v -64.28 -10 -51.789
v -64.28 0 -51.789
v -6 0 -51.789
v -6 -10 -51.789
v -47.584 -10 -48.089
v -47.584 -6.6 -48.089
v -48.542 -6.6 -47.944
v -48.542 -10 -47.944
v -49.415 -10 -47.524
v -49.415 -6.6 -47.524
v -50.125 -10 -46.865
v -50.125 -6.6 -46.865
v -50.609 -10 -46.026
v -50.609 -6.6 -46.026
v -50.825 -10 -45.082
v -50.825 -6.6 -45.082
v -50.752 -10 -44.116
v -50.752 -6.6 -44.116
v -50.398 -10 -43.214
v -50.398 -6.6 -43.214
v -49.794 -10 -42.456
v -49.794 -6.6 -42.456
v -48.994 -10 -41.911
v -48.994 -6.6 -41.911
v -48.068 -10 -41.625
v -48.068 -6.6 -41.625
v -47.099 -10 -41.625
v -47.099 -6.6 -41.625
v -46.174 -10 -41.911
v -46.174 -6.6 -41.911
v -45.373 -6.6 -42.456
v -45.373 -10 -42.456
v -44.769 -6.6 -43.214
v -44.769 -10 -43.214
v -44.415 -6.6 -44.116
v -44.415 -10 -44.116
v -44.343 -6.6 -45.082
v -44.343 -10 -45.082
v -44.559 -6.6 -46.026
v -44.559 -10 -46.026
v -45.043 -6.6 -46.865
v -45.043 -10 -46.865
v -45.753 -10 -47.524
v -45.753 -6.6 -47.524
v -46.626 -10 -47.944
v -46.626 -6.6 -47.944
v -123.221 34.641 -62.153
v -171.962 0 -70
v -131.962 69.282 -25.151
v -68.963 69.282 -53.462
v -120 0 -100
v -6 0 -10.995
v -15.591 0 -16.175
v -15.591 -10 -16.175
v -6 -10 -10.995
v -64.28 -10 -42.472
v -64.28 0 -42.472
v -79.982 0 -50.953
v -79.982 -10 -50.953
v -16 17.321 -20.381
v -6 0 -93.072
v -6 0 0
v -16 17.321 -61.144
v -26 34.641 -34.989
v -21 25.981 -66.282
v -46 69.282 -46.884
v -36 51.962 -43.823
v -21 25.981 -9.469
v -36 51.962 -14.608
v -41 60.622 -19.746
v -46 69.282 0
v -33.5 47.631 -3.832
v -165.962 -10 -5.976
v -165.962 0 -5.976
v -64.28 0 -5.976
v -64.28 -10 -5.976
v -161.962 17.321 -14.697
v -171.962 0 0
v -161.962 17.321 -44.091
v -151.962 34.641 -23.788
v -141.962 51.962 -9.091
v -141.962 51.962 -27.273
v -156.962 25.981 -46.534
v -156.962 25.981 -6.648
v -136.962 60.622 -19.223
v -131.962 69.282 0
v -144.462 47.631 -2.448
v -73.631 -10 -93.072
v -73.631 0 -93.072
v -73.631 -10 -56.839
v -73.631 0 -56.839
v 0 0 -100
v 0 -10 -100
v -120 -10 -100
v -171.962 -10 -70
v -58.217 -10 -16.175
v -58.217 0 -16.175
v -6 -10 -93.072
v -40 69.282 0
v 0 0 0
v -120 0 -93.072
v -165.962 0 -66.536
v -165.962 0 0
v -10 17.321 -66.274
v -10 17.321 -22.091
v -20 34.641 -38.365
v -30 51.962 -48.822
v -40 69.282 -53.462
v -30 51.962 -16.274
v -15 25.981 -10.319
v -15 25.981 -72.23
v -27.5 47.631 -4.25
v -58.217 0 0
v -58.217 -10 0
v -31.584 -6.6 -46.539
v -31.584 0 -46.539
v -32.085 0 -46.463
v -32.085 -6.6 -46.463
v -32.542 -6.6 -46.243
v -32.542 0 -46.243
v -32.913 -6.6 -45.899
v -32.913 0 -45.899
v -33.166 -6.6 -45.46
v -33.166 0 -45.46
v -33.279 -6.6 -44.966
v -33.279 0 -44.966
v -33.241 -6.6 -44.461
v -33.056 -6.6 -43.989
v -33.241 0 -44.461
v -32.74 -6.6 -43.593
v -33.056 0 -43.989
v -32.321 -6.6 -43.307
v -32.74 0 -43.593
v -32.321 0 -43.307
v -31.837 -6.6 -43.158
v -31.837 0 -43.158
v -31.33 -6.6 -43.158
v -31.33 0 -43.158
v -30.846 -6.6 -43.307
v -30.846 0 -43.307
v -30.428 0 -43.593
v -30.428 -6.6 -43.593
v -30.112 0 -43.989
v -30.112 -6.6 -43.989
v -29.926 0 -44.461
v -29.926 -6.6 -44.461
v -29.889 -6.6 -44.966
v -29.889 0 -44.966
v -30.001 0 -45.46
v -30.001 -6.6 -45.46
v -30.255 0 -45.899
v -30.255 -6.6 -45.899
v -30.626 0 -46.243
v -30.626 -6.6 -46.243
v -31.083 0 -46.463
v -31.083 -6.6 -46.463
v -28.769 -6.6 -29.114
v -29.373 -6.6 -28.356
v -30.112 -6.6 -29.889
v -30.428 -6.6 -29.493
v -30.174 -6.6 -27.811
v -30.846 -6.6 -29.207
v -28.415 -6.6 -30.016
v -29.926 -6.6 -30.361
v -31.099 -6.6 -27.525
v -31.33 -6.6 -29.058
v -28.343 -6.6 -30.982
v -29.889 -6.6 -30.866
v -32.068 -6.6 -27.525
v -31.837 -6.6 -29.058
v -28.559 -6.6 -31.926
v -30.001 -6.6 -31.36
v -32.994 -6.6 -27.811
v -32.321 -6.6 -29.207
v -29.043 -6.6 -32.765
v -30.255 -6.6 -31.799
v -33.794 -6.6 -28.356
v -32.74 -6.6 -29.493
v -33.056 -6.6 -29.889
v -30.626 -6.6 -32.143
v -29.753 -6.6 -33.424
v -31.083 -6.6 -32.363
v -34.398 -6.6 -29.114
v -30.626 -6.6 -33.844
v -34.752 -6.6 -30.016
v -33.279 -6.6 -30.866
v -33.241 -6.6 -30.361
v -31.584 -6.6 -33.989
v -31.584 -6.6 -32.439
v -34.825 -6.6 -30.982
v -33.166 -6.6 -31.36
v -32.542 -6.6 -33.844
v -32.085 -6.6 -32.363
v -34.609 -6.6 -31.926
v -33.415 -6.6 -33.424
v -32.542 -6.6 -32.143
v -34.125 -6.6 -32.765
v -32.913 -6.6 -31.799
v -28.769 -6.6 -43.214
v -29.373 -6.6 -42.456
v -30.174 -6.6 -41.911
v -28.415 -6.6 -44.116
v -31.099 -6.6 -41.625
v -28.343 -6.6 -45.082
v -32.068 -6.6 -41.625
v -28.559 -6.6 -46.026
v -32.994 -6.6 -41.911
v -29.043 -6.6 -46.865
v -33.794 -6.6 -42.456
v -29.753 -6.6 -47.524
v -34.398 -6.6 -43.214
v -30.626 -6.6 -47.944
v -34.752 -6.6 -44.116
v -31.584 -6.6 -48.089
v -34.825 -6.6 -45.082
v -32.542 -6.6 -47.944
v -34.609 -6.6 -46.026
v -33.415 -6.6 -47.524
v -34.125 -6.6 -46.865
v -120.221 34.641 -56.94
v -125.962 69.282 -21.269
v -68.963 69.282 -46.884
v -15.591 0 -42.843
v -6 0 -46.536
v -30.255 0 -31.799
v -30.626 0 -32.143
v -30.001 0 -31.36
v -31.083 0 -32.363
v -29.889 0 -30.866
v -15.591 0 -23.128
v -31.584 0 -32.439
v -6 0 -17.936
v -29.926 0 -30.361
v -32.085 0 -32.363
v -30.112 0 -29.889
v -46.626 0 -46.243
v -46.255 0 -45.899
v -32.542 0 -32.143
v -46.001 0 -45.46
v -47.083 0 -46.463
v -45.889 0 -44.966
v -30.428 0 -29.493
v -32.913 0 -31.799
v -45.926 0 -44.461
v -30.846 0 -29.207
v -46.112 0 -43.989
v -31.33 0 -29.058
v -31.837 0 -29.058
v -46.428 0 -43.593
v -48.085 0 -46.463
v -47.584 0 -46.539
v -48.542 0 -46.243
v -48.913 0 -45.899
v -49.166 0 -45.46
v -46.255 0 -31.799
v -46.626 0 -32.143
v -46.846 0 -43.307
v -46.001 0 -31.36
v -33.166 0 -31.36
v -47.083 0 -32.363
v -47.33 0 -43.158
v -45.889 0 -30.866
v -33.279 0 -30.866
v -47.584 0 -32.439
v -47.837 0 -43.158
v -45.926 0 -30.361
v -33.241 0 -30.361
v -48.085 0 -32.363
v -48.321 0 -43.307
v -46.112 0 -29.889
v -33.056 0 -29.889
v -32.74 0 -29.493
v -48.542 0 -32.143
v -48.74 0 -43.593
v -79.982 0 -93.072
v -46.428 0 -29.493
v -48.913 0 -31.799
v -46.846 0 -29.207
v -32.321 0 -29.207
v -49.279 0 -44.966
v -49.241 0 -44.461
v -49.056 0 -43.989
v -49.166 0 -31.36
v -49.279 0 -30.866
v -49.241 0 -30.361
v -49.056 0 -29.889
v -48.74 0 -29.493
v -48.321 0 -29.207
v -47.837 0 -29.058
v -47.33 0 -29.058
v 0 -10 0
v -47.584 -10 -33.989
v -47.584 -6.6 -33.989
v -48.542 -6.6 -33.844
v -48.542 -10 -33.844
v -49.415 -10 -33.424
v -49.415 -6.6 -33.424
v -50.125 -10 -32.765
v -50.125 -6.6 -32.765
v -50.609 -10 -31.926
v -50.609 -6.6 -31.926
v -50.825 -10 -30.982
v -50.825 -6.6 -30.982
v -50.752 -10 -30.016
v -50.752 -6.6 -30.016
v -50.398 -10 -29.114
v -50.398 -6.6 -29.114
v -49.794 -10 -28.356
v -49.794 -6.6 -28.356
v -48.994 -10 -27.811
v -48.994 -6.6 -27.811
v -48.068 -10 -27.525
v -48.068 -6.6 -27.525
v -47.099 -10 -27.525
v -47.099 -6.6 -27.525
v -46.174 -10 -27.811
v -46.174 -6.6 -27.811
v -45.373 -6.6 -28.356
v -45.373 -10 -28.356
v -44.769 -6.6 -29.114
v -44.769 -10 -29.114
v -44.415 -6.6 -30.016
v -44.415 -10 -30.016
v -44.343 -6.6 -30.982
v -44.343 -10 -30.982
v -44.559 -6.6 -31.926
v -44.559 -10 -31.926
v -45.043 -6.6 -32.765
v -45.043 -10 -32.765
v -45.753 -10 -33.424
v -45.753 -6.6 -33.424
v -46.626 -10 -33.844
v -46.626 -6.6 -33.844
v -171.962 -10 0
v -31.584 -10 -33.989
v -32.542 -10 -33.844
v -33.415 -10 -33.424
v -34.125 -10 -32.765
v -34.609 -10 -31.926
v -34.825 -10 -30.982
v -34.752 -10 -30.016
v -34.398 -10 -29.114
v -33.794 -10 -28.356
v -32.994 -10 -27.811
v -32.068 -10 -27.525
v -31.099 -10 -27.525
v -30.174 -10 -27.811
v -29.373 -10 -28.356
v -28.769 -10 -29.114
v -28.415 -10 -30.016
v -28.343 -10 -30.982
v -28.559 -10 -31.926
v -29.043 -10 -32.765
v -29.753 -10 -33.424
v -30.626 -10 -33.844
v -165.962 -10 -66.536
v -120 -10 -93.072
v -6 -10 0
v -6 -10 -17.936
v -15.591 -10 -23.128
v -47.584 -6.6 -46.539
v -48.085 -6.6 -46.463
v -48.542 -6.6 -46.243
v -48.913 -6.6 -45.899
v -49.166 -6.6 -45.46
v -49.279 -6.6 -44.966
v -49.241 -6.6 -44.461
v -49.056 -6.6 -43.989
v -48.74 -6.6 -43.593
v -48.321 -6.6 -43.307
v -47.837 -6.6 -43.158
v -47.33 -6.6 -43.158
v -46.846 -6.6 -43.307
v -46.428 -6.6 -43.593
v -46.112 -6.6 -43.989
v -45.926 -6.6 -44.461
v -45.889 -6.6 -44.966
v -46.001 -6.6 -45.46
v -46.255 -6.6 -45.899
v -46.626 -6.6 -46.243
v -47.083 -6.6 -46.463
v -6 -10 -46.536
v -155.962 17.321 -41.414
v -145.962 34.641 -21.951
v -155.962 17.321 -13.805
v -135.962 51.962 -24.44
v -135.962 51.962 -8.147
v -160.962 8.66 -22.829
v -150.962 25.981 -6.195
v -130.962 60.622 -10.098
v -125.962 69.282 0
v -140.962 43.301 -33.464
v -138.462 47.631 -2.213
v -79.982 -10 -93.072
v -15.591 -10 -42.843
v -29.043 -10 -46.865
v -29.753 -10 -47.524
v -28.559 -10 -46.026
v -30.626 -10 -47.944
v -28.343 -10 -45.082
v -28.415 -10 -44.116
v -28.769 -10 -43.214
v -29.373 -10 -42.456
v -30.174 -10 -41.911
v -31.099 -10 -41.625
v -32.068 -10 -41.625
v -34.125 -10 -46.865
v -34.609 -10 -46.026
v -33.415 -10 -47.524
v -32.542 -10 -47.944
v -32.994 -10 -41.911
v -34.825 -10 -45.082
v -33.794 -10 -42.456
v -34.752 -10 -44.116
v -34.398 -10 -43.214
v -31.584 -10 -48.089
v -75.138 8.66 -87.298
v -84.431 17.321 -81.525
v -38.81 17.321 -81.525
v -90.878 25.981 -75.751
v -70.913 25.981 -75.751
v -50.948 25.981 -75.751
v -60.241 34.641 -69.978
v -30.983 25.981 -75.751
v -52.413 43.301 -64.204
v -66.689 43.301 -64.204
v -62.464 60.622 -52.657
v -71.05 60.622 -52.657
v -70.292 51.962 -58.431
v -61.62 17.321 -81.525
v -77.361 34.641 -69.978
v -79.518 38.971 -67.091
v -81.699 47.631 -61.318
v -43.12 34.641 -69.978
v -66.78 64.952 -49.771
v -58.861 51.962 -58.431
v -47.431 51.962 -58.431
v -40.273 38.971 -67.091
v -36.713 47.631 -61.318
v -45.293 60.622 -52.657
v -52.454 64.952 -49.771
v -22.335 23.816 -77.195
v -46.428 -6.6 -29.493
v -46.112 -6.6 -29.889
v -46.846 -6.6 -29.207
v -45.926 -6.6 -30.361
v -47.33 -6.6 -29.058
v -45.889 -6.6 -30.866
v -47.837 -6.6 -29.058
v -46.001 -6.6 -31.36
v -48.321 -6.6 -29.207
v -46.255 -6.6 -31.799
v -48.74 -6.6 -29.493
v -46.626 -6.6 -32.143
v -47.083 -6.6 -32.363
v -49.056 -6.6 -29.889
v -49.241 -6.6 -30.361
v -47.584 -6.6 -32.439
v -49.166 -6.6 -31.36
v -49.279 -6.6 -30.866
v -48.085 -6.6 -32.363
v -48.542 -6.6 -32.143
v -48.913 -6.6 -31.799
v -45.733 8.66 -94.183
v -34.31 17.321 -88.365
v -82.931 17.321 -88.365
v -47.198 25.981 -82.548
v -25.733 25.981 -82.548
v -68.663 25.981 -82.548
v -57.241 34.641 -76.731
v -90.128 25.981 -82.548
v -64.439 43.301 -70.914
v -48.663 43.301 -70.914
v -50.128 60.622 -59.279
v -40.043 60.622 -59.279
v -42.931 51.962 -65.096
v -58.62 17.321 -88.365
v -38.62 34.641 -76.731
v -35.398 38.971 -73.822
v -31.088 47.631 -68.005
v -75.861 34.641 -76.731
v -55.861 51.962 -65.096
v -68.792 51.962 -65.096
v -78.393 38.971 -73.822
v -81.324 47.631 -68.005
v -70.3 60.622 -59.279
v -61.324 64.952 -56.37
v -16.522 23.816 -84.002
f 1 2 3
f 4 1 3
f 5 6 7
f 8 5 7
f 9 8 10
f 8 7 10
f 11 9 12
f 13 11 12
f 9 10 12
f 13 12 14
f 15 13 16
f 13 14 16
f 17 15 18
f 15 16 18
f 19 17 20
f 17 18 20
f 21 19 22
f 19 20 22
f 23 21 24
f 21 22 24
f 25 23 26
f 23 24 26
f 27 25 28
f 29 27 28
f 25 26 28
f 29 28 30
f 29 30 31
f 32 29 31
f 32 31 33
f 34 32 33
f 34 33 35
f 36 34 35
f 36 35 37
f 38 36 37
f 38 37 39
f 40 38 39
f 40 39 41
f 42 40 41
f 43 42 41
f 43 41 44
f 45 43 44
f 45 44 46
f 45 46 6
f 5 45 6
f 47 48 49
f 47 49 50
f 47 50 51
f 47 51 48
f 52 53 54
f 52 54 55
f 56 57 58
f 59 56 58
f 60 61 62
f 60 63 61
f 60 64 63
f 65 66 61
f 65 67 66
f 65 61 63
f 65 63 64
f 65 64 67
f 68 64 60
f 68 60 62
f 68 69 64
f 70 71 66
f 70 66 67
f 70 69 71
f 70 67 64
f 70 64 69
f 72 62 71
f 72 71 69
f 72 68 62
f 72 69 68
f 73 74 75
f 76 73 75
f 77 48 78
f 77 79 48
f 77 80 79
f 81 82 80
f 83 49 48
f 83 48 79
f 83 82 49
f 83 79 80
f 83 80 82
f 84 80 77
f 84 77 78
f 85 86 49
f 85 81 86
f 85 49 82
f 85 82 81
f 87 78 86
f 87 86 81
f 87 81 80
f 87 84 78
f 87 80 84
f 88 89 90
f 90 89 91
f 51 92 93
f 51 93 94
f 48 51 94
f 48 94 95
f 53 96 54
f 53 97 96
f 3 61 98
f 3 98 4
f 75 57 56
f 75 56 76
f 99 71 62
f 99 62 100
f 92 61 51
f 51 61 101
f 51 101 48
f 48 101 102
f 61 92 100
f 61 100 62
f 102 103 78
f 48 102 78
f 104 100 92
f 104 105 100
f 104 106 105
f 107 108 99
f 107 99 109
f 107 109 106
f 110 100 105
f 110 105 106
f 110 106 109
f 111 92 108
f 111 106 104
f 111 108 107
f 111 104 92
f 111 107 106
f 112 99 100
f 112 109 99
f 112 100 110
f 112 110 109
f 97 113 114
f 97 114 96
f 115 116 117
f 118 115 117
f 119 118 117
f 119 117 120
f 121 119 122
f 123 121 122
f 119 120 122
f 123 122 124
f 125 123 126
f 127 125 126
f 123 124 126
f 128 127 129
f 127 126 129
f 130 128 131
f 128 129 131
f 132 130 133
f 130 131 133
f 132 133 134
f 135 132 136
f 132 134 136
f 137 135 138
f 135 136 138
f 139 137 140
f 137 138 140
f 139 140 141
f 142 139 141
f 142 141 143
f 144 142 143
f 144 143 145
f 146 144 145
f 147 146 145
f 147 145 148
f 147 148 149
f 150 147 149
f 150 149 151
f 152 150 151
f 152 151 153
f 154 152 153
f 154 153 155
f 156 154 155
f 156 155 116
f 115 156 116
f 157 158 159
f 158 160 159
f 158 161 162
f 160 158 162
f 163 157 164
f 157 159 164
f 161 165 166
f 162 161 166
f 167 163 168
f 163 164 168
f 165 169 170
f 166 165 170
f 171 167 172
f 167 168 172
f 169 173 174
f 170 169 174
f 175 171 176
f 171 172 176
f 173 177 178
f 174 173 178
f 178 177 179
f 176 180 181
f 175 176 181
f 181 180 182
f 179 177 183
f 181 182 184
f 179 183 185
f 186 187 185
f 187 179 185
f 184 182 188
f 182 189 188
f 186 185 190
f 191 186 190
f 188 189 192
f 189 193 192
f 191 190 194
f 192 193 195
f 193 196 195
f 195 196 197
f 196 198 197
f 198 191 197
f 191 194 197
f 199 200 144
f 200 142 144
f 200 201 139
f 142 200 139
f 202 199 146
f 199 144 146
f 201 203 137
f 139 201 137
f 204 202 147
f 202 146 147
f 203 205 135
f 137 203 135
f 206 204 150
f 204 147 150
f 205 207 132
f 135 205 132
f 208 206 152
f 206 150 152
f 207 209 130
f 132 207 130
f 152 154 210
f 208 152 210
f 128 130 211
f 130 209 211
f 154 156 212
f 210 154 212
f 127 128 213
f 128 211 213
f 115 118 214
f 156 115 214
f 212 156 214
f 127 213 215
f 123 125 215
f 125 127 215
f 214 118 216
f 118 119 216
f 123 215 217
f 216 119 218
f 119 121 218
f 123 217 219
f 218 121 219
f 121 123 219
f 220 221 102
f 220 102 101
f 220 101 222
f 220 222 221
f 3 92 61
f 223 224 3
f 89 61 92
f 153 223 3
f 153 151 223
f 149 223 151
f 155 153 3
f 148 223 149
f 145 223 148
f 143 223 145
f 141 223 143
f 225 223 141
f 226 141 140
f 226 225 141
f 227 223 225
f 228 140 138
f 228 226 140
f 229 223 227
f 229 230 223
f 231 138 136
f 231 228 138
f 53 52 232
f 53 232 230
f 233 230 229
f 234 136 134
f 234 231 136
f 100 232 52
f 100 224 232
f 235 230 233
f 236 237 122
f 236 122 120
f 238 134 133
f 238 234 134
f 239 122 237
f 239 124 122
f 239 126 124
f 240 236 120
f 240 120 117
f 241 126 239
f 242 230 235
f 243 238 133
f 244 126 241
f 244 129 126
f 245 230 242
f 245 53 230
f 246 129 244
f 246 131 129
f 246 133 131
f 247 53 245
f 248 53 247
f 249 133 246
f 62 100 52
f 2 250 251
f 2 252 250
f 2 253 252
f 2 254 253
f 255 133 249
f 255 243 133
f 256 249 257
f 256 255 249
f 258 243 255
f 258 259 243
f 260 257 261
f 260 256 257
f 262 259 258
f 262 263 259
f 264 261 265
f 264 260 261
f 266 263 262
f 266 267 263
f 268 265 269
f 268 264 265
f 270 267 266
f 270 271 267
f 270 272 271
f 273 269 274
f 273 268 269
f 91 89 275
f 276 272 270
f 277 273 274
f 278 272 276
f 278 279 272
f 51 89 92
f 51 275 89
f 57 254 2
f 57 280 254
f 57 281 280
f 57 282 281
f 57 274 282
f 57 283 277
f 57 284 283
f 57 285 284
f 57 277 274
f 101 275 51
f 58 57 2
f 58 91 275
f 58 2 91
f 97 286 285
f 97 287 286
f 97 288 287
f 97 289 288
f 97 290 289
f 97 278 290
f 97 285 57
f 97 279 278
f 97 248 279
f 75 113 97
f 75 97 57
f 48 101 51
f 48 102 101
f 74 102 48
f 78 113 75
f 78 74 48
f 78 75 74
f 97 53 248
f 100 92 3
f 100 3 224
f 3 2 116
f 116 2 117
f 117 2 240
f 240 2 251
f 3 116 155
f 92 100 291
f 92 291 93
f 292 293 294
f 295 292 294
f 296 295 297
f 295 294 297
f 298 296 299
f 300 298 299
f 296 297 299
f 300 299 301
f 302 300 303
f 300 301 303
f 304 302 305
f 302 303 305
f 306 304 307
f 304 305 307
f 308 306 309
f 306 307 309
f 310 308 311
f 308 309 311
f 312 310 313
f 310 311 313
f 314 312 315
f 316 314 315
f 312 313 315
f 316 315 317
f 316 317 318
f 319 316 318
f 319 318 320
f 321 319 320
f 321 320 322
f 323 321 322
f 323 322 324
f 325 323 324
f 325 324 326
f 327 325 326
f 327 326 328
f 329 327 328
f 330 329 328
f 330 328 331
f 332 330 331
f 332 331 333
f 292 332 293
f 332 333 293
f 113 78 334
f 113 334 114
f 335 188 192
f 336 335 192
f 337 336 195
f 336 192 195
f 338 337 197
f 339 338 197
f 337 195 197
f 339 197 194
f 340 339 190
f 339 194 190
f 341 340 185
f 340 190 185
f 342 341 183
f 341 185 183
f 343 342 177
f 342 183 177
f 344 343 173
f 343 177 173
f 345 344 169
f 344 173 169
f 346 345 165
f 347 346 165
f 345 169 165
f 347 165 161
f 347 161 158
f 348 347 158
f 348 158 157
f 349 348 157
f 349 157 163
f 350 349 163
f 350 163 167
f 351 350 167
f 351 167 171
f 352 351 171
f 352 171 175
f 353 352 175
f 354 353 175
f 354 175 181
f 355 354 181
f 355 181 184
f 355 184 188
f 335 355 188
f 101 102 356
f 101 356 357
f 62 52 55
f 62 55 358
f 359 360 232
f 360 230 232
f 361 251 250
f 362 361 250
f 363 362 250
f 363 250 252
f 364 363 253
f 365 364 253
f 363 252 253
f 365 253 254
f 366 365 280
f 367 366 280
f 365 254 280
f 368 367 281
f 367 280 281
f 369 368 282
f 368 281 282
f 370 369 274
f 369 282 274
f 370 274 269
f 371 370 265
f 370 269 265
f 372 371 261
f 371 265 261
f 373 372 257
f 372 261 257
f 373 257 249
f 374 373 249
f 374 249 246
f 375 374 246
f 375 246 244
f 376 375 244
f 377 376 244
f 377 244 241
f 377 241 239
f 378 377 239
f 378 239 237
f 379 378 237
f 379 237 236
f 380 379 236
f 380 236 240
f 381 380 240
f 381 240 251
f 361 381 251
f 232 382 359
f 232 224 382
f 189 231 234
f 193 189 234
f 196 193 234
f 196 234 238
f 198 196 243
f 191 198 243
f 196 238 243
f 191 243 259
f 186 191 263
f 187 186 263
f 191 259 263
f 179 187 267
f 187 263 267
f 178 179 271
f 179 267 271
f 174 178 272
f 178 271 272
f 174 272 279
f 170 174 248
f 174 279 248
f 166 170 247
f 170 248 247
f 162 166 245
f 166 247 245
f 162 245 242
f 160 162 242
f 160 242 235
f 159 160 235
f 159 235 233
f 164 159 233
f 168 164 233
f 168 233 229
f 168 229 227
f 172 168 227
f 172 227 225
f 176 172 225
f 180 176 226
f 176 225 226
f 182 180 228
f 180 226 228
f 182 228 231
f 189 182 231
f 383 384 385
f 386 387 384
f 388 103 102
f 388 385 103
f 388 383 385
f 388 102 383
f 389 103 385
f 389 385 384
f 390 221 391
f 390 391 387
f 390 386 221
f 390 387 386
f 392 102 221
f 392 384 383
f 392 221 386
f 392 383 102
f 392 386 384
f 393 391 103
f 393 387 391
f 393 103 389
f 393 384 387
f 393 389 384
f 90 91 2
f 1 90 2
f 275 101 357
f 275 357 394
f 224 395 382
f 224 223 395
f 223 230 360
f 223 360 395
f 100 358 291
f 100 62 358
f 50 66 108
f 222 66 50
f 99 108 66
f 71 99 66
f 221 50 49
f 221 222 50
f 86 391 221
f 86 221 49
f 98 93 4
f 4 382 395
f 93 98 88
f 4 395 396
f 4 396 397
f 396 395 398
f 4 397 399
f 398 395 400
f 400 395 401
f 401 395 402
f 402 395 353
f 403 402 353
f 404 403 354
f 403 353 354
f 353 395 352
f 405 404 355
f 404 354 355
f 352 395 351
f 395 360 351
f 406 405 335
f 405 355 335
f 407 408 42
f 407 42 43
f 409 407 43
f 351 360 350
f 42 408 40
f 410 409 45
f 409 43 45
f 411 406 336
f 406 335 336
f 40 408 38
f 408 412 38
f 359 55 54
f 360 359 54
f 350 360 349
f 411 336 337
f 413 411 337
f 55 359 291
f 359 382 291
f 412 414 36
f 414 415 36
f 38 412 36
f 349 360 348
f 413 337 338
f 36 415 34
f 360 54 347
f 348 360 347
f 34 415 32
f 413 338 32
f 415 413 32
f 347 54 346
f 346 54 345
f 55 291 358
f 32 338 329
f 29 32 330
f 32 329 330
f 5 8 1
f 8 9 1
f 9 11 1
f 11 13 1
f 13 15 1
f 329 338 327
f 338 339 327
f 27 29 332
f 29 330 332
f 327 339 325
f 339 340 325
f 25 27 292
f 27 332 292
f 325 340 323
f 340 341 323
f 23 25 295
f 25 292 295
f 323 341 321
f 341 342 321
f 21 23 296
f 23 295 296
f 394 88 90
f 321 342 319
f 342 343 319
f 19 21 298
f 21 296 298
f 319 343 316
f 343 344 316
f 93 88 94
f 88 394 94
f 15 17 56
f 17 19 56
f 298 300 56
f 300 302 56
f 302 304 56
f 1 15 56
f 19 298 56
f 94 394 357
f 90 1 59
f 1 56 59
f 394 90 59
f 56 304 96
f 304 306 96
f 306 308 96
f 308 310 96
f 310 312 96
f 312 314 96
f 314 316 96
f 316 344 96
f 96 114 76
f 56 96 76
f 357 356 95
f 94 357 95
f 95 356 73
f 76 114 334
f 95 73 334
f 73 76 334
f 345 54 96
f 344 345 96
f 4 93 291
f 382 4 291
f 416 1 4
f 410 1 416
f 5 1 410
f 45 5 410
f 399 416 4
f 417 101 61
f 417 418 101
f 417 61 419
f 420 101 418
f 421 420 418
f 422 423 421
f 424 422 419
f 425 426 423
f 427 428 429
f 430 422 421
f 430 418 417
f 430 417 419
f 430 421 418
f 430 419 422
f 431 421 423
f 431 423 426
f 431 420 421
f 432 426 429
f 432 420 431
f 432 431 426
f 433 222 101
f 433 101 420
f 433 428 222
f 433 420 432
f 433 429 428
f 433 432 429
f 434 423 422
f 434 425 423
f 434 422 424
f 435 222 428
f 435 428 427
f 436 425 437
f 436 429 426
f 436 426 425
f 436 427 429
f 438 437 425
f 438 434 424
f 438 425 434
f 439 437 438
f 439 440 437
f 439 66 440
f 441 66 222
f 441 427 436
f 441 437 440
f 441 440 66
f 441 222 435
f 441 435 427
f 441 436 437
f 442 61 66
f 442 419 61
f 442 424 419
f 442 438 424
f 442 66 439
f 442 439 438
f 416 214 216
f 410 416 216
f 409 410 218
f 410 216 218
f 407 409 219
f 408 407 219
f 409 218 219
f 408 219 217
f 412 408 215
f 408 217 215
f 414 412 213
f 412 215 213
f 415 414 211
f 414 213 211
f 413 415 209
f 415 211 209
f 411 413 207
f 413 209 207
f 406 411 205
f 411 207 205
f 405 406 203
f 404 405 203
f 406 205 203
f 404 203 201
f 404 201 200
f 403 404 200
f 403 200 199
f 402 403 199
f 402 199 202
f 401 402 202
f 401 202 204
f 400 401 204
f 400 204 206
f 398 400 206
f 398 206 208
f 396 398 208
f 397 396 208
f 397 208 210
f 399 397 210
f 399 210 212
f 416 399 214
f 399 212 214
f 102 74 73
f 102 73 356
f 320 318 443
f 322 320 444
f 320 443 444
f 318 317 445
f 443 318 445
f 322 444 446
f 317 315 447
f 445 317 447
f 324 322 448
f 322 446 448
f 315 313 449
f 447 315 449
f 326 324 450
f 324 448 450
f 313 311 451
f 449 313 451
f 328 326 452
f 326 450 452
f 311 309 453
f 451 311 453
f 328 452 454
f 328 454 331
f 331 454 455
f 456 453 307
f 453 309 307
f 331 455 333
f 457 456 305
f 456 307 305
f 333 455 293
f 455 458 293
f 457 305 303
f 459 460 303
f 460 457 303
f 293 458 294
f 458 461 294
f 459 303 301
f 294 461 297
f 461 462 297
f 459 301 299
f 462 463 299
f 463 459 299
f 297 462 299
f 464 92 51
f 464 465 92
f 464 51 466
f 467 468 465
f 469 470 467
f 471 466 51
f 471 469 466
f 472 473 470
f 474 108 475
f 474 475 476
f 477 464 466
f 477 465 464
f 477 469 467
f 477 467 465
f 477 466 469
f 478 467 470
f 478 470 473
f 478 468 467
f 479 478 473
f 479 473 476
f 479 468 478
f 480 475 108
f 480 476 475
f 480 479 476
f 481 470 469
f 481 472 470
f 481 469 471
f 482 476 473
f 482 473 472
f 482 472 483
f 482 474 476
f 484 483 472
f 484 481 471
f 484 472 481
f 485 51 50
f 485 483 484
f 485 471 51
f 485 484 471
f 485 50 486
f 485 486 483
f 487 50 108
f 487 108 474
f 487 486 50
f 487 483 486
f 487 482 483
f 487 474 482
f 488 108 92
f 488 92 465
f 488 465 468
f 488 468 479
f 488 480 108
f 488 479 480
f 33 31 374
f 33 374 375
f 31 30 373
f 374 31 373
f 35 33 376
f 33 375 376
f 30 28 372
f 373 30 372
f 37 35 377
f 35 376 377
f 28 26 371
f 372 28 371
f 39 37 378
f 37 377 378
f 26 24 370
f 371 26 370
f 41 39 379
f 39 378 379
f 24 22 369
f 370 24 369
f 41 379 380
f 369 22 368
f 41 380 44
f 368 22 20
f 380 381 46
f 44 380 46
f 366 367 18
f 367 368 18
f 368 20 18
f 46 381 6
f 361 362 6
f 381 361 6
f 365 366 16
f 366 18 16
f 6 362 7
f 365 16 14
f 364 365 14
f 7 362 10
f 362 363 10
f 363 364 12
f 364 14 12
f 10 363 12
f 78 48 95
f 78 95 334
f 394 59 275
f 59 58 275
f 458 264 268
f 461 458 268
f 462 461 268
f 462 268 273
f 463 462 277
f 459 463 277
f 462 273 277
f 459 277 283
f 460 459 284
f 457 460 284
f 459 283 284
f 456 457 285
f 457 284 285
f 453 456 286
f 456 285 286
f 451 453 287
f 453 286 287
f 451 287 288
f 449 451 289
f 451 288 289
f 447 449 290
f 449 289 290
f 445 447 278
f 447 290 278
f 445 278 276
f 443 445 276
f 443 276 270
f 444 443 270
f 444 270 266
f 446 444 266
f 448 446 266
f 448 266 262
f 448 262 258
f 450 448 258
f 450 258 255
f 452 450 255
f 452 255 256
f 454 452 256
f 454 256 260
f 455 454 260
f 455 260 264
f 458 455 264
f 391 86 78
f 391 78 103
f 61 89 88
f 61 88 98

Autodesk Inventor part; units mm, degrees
ref_plane "YZ Plane" through (0, 0, 0) normal (1, 0, 0) x (0, 1, 0)
ref_plane "XZ Plane" through (0, 0, 0) normal (0, 1, 0) x (-1, 0, 0)
sketch "Base Sketch" plane through (0, 0, 0) normal (0, 1, 0) x (-1, 0, 0)
  line L0 (0, 0) -> (0, -100)
  line L1 (0, -100) -> (120, -100)
  line L2 (120, -100) -> (171.961524, -70)
  line L3 (171.961524, -70) -> (171.961524, 0)
  line L4 (171.961524, 0) -> (0, 0)
  line L5 (165.961524, 0) -> (165.961524, -66.535898)
  line L6 (165.961524, -66.535898) -> (120, -93.071797)
  line L7 (142.980762, -79.803848) -> (145.980762, -85) construction
  line L8 (165.961524, -66.535898) -> (171.961524, -66.535898) construction
  line L9 (120, -93.071797) -> (6, -93.071797)
  line L10 (6, -93.071797) -> (6, 0)
  line L11 (6, -93.071797) -> (0, -93.071797) construction
  line L12 (120, -93.071797) -> (6, -93.071797)
  line L13 (6, -93.071797) -> (6, -50.829914)
  line L14 (64.279786, -42.471598) -> (64.279786, 0)
  line L15 (64.279786, -42.471598) -> (79.982467, -50.95258)
  line L16 (79.982467, -50.95258) -> (79.982467, -93.071797)
  line L17 (73.630775, -93.071797) -> (73.630775, -56.839275)
  line L18 (73.630775, -56.839275) -> (64.279786, -51.788827)
  line L19 (64.279786, -51.788827) -> (6, -51.788827)
  line L20 (15.591156, -23.128064) -> (15.591156, -42.842523)
  line L21 (15.591156, -42.842523) -> (6, -46.535898)
  line L22 (165.961524, -5.975934) -> (64.279786, -5.975934)
  line L23 (58.217157, 0) -> (58.217157, -16.174978)
  line L24 (58.217157, -16.174978) -> (15.591156, -16.174978)
  line L25 (15.591156, -23.128064) -> (6, -17.935692)
  line L26 (15.591156, -16.174978) -> (6, -10.994816)
  dimension "d0" = 100
  dimension "d1" = 120
  dimension "d3" = 60
  dimension "d4" = 120
  dimension "d5" = 6
sketch3d "3D Scaffold Sketch"
ref_plane "Ceiling" through (-46, 69.282032, -46.883775) normal (0, 1, 0) x (0, 0, 1)
sketch "Ceiling Sketch" plane through (-46, 69.282032, -46.883775) normal (0, 1, 0) x (0, 0, 1)
  line L0 (46.883775, -79.961524) -> (46.883775, 0)
  line L1 (0, 0) -> (46.883775, 0)
  line L2 (0, -22.962669) -> (0, 0)
  line L3 (0, -22.962669) -> (25.614297, -79.961524)
  line L4 (46.883775, -79.961524) -> (25.614297, -79.961524)
  line L5 (46.883775, 0) -> (46.883775, 6)
  line L6 (46.883775, 6) -> (-6.577994, 6)
  line L7 (-6.577994, 6) -> (-6.577994, -22.962669)
  line L8 (-6.577994, -22.962669) -> (21.732598, -85.961524)
  line L9 (21.732598, -85.961524) -> (46.883775, -85.961524)
  line L10 (46.883775, -85.961524) -> (46.883775, -79.961524)
  line L11 (-19.652123, -119.961524) -> (-19.652123, -125.961524) construction
  line L12 (12.807148, -51.462096) -> (7.334356, -53.921474) construction
  point P0 (46.883775, 46)
sketch3d "3D Scaffold Finish Sketch"
sketch "Base Sketch outline for Loft1" plane through (0, 0, 0) normal (0, 1, 0) x (-1, 0, 0)
  line L0 (6, 0) -> (0, 0)
  line L1 (6, -93.071797) -> (6, 0)
  line L2 (120, -93.071797) -> (6, -93.071797)
  line L3 (165.961524, -66.535898) -> (120, -93.071797)
  line L4 (165.961524, 0) -> (165.961524, -66.535898)
  line L5 (171.961524, 0) -> (165.961524, 0)
  line L6 (171.961524, -70) -> (171.961524, 0)
  line L7 (120, -100) -> (171.961524, -70)
  line L8 (0, -100) -> (120, -100)
  line L9 (0, 0) -> (0, -100)
sketch "Ceiling Sketch outline for Loft1" plane through (-46, 69.282032, -46.883775) normal (0, 1, 0) x (0, 0, 1)
  line L0 (46.883775, -85.961524) -> (46.883775, -79.961524)
  line L1 (21.732598, -85.961524) -> (46.883775, -85.961524)
  line L2 (-6.577994, -22.962669) -> (21.732598, -85.961524)
  line L3 (-6.577994, 6) -> (-6.577994, -22.962669)
  line L4 (46.883775, 6) -> (-6.577994, 6)
  line L5 (46.883775, 0) -> (46.883775, 6)
  line L6 (0, 0) -> (46.883775, 0)
  line L7 (0, -22.962669) -> (0, 0)
  line L8 (25.614297, -79.961524) -> (0, -22.962669)
  line L9 (46.883775, -79.961524) -> (25.614297, -79.961524)
loft "Loft1" add profiles "Base Sketch outline for Loft1", "Ceiling Sketch outline for Loft1"
extrude "Base Extrusion" add sketch "Base Sketch" against normal blind 10 separate body contours L4 L10 L9 L6 L5 L3 L2 L1 L0 | L4 L14 L15 L16 L9 L17 L18 L19 L10 L21 L20 L25 L26 L24 L23 | L4 L5 L22 L14
sketch "Sketch4" plane through (0, -10, 0) normal (0, -1, 0) x (1, 0, 0)
  line L0 (-47.583857, -30.738827) -> (-31.583857, -30.738827) construction
  line L1 (-31.583857, -30.738827) -> (-31.583857, -44.838827) construction
  line L2 (-31.583857, -44.838827) -> (-47.583857, -44.838827) construction
  line L3 (-47.583857, -44.838827) -> (-47.583857, -30.738827) construction
  line L4 (-39.583857, -44.838827) -> (-39.583857, -30.738827) construction
  line L5 (-47.583857, -37.788827) -> (-31.583857, -37.788827) construction
  line L6 (-64.279786, -51.788827) -> (-6, -51.788827)
  point P0 (0, 0)
  dimension "d42" = 14.1
  dimension "d43" = 16
  dimension "d45" = 14
hole "Hole1" at (-47.583857, -10, -30.738827) at (-47.583857, -10, -44.838827) at (-31.583857, -10, -30.738827) at (-31.583857, -10, -44.838827) direction (0, 1, 0) diameter 3.4 end through all counterbore diameter 6.5 counterbore depth 3.4 bodies 2 clearance for "Socket Head Cap Screw ISO 4762" size "M3" standard "ISO"
